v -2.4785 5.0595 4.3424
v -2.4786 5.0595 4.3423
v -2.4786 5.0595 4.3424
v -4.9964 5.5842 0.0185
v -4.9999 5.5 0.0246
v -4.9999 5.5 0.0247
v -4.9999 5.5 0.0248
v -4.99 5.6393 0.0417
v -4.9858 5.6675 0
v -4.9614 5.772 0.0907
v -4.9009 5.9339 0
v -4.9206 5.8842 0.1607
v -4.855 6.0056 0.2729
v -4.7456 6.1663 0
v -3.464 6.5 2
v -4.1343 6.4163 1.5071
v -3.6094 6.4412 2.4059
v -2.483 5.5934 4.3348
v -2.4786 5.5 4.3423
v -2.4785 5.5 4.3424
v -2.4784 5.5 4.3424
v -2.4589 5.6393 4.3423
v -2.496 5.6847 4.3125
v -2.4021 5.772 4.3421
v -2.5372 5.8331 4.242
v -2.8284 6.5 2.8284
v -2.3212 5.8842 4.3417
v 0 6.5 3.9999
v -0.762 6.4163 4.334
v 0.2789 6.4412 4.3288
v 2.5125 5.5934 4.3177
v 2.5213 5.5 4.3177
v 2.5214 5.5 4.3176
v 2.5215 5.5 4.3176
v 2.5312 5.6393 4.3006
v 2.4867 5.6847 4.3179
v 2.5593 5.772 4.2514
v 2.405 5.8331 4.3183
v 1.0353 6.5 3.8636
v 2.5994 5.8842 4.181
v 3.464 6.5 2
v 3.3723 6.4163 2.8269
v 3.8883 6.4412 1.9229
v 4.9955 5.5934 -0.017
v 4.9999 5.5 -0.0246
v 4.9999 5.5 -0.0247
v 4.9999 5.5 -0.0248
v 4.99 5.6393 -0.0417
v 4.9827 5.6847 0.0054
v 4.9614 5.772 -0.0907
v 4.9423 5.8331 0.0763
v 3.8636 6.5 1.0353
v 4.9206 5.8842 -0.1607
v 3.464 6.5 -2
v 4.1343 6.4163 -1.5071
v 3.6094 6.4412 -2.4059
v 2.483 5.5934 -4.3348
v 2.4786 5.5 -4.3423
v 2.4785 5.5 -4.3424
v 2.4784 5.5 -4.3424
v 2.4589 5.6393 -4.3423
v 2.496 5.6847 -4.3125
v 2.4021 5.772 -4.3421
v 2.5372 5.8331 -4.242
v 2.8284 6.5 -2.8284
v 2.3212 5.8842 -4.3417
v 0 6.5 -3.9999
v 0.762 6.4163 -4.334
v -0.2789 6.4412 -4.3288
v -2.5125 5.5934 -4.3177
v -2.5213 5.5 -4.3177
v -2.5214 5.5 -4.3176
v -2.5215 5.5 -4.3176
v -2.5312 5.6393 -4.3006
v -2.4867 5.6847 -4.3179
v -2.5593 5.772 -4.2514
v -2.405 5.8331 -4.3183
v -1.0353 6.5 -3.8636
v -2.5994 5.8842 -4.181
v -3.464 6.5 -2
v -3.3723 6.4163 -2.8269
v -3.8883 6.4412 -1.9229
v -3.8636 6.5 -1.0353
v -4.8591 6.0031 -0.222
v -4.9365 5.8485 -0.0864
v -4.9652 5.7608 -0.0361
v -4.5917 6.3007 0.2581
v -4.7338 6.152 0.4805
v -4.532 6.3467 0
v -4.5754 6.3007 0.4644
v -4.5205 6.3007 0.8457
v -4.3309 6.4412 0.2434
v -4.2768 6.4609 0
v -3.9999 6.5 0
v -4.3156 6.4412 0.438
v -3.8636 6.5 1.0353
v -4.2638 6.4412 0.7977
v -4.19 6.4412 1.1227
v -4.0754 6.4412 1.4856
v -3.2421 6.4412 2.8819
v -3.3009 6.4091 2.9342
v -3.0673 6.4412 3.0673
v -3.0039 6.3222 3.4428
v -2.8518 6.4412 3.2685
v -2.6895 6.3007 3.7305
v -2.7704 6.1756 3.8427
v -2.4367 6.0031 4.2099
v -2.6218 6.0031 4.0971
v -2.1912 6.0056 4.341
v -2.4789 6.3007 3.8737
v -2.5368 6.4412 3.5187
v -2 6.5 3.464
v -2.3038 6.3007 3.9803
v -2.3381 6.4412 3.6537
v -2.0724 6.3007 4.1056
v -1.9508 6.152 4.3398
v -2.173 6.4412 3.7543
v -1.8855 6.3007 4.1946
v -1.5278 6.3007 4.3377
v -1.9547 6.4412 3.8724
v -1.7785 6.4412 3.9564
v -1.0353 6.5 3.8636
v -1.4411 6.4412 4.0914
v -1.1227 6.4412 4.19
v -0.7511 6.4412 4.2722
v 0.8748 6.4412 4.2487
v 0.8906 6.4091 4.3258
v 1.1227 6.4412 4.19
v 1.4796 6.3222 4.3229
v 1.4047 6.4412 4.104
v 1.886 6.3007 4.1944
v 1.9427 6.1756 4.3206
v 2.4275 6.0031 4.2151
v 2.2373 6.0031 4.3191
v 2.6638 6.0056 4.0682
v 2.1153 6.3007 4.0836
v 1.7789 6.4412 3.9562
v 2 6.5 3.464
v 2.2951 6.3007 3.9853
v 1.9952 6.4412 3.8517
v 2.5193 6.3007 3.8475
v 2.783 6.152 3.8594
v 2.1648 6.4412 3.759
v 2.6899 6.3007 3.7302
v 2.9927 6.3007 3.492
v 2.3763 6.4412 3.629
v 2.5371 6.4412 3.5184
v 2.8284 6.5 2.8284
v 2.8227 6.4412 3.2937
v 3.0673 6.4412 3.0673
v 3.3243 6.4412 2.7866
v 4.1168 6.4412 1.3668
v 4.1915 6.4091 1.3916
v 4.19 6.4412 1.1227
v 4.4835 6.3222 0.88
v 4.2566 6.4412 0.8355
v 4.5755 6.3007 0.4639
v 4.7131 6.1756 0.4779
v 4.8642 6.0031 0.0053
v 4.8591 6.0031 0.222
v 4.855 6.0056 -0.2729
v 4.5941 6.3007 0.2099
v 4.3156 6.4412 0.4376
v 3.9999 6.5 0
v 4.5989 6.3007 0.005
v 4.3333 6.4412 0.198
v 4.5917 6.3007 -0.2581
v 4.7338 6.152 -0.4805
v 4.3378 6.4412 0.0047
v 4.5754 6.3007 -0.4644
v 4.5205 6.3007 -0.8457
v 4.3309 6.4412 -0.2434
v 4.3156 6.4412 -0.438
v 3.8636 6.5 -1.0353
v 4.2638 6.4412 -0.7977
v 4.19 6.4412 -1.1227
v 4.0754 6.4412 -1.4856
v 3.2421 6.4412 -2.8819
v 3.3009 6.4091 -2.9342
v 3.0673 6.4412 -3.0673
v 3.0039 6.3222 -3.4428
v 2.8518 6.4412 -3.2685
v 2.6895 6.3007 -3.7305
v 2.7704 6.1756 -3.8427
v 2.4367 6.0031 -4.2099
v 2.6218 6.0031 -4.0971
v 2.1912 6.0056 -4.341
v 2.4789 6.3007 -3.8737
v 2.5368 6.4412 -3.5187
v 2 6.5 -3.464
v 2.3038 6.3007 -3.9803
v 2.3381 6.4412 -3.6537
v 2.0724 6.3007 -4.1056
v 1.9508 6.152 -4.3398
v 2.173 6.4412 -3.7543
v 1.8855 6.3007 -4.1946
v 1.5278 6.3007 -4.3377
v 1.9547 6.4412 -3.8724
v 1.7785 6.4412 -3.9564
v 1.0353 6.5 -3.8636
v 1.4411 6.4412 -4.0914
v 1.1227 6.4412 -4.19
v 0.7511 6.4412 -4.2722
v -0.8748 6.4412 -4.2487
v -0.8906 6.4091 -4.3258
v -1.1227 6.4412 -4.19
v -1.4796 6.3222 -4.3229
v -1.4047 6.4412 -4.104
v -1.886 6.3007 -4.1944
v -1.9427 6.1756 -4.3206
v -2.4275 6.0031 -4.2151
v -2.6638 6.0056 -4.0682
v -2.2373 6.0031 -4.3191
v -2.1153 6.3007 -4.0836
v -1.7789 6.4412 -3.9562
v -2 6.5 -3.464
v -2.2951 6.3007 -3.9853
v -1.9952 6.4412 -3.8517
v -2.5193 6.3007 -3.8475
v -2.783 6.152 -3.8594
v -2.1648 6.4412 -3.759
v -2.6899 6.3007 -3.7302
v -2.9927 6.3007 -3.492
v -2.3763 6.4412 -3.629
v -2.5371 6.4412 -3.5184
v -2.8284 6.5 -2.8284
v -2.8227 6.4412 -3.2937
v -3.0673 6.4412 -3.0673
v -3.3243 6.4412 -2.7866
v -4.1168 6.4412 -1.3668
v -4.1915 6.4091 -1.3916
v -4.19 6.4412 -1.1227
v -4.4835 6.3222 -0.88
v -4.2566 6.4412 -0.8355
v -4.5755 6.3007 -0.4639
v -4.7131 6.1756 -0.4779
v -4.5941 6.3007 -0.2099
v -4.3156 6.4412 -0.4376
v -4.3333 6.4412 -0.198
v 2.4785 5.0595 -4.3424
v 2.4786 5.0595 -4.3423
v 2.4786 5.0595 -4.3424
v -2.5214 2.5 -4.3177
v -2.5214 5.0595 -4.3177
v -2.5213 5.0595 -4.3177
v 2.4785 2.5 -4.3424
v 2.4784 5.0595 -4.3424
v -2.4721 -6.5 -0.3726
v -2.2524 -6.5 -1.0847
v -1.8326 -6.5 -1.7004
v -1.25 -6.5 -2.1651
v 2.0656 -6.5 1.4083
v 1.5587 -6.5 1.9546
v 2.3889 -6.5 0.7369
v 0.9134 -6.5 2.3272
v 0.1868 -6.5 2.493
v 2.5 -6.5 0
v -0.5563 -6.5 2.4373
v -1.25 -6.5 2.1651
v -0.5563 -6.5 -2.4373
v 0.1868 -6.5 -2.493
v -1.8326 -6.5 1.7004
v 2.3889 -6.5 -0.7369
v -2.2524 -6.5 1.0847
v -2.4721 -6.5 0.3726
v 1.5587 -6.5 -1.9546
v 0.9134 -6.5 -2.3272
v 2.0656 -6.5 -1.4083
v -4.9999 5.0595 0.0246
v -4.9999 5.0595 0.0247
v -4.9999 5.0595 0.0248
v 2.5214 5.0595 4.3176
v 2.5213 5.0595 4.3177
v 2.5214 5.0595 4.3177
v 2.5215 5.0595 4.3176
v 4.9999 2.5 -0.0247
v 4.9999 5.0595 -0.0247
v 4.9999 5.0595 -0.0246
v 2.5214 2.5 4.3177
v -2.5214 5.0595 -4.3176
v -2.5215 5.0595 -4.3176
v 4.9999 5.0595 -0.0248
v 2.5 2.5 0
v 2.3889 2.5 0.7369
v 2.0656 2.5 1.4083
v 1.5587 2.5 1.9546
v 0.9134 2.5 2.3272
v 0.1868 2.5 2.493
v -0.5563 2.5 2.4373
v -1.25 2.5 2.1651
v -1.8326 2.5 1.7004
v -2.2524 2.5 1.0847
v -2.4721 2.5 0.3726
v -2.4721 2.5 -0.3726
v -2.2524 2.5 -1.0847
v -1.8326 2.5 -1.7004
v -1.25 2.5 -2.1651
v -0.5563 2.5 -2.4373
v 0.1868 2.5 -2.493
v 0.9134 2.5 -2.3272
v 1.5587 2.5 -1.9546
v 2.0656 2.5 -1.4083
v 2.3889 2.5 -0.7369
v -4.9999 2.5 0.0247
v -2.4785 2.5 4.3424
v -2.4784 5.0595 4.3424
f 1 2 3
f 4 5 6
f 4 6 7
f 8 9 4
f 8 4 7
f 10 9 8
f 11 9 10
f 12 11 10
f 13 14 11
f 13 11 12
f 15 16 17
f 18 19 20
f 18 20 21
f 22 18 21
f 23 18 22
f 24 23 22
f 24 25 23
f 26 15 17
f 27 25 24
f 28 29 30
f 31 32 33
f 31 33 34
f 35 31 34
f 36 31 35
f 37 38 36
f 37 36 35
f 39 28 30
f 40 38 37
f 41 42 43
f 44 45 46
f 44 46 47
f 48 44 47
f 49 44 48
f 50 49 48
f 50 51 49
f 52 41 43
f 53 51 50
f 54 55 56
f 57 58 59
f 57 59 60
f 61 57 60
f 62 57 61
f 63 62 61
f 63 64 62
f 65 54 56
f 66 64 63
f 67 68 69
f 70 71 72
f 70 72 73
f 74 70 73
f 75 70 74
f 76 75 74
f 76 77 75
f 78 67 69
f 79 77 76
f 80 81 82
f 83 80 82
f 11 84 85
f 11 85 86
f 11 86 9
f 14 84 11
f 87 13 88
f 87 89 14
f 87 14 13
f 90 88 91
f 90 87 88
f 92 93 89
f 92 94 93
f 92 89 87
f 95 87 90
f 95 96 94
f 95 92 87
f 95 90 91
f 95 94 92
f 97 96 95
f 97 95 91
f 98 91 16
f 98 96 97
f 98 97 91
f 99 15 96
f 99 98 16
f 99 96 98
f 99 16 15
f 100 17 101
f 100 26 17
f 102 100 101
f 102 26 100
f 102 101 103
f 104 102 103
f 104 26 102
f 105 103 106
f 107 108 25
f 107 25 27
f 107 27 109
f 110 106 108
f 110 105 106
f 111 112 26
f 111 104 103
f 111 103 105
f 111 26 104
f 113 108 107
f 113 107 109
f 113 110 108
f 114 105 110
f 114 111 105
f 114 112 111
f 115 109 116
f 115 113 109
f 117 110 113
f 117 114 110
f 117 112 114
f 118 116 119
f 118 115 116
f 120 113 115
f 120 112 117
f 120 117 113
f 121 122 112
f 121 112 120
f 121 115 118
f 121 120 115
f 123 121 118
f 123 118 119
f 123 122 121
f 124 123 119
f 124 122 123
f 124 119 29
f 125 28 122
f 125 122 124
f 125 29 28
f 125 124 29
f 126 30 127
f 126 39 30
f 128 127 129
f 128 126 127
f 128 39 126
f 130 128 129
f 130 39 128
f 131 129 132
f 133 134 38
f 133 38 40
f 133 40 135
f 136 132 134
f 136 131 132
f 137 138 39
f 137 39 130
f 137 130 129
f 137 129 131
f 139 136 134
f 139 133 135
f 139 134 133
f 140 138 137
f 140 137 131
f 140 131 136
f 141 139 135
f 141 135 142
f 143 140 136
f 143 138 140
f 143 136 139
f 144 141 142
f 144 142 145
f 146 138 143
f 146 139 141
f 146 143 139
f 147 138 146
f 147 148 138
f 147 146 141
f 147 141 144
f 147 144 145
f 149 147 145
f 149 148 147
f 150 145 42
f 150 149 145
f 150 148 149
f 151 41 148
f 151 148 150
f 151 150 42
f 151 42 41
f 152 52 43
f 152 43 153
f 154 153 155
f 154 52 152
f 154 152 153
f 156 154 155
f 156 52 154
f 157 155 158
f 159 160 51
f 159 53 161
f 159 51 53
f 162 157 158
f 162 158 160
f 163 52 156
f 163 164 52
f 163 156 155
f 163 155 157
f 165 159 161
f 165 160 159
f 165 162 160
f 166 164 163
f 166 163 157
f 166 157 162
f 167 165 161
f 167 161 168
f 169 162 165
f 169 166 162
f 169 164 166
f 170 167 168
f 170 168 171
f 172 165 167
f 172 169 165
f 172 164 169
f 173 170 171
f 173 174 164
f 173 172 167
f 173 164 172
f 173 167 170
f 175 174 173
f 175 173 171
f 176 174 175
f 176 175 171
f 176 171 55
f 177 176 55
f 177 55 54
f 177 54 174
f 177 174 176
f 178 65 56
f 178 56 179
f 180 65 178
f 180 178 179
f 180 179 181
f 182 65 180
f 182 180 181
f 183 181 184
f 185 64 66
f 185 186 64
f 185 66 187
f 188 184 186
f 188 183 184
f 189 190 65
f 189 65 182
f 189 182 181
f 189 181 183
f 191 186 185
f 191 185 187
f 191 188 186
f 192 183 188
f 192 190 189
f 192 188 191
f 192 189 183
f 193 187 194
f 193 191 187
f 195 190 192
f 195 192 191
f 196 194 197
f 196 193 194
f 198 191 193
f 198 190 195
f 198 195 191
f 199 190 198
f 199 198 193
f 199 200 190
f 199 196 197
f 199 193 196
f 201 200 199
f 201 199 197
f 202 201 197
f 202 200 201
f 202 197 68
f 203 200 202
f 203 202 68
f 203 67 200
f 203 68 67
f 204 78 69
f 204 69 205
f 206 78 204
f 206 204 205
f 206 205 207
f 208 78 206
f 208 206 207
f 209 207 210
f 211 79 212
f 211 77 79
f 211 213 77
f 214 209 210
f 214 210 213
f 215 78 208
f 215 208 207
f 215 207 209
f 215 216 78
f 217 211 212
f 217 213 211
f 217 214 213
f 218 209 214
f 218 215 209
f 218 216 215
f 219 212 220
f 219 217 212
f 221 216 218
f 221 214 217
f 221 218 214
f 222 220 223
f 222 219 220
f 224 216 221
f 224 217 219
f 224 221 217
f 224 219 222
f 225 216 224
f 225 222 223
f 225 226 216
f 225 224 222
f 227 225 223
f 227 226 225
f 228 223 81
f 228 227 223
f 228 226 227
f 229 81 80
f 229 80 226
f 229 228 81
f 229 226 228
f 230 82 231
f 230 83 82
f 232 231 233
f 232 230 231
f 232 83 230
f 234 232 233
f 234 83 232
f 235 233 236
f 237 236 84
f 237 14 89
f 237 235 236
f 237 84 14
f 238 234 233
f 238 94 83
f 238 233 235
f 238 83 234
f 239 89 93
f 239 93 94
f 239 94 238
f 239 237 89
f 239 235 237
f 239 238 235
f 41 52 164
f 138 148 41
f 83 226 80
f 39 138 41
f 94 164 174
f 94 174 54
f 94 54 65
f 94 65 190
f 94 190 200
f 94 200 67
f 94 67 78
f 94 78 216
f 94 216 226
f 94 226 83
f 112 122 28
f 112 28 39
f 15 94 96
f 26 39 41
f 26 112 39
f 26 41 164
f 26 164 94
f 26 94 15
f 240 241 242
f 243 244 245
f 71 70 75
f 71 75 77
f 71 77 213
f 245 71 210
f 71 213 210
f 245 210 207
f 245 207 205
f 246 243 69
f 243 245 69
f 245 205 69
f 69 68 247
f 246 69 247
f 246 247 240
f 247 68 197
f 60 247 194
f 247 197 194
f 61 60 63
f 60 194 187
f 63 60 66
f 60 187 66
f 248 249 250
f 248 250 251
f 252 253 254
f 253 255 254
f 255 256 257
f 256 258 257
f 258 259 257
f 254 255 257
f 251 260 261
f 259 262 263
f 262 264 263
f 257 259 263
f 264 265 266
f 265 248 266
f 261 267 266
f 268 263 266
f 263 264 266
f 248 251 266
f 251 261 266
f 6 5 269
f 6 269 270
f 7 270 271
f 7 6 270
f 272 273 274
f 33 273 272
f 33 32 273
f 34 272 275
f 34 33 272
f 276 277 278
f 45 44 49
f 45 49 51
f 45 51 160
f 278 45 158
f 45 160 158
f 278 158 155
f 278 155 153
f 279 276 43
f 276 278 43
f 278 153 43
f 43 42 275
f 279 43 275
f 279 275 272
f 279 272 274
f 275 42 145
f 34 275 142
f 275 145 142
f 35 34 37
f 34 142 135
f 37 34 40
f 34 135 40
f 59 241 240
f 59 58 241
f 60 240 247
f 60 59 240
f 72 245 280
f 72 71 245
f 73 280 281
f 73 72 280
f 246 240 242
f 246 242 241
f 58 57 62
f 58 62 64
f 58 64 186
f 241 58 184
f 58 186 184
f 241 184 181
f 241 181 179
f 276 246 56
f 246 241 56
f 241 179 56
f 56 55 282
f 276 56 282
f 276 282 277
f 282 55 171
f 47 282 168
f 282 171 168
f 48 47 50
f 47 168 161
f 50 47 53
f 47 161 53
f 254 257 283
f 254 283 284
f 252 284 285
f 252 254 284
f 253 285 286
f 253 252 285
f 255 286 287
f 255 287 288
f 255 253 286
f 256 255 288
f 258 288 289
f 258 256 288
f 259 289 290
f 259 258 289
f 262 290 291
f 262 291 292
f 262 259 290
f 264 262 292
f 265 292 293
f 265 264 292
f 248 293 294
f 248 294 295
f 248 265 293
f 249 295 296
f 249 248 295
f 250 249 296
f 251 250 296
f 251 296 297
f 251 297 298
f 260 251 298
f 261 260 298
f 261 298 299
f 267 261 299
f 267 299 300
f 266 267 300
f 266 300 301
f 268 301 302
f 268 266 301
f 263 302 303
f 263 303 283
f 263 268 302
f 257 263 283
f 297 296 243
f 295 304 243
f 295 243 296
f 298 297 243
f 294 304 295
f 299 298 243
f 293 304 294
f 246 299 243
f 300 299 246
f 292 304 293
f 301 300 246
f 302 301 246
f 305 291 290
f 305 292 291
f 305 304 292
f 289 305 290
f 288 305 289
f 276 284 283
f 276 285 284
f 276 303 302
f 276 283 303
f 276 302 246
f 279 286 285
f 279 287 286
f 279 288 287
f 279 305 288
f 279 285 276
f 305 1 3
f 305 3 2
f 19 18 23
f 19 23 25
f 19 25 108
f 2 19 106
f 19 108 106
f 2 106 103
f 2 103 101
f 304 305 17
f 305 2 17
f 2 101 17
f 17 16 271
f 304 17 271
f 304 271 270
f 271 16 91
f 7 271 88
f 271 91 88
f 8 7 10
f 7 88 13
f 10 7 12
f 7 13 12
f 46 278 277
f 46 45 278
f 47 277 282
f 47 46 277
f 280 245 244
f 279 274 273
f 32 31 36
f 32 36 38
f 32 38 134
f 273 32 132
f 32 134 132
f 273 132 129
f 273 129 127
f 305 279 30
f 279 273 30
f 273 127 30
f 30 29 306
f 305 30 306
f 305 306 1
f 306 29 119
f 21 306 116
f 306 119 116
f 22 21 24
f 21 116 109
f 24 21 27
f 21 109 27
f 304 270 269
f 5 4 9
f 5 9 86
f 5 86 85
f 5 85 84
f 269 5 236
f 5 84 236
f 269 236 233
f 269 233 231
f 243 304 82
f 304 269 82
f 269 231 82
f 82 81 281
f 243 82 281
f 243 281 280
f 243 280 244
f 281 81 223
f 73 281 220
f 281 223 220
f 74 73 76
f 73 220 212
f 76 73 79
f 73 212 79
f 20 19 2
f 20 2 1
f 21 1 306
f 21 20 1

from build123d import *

# Parameters (mm, degrees)
SKETCH1_R           = 5
BOSS_EXTRUDE1_DEPTH = 6.5
SKETCH2_R           = 5
SKETCH2_R_2         = 2.5
CUT_EXTRUDE1_DEPTH  = 9
CUT_EXTRUDE2_DEPTH  = 4


with BuildPart() as part:
    # Sketch1 → Boss-Extrude1 (new body, symmetric)
    with BuildSketch(Plane(origin=(0, 0, 0), x_dir=(1, 0, 0), z_dir=(0, 1, 0))):
        Circle(SKETCH1_R)
    extrude(amount=BOSS_EXTRUDE1_DEPTH, both=True)

    # Sketch2 → Cut-Extrude1 (cut)
    with BuildSketch(Plane.XZ.offset(6.5)):
        Circle(SKETCH2_R)
        Circle(SKETCH2_R_2, mode=Mode.SUBTRACT)
    extrude(amount=-CUT_EXTRUDE1_DEPTH, mode=Mode.SUBTRACT)

    # Sketch4 → Cut-Extrude2 (cut)
    with BuildSketch(Plane(origin=(0, 6.5, 0), x_dir=(1, 0, 0), z_dir=(0, 1, 0))):
        with BuildLine():
            Line((-4.999938781, -0.024742442), (-2.521396974, 4.317702781))
            ThreePointArc((-2.521396974, 4.317702781), (-4.342445223, 2.478541807), (-4.999938781, -0.024742442))
        make_face()
        with BuildLine():
            Line((-2.478541807, -4.342445223), (-4.999938781, -0.024742442))
            ThreePointArc((-4.999938781, -0.024742442), (-4.317702781, -2.521396974), (-2.478541807, -4.342445223))
        make_face()
        with BuildLine():
            ThreePointArc((-2.478541807, -4.342445223), (0.024742442, -4.999938781), (2.521396974, -4.317702781))
            Line((2.521396974, -4.317702781), (-2.478541807, -4.342445223))
        make_face()
        with BuildLine():
            ThreePointArc((5, 0), (4.999984695, 0.012371259), (4.999938781, 0.024742442))
            Line((4.999938781, 0.024742442), (2.521396974, -4.317702781))
            ThreePointArc((2.521396974, -4.317702781), (4.336299394, -2.489278523), (5, 0))
        make_face()
        with BuildLine():
            ThreePointArc((4.999938781, 0.024742442), (4.317702781, 2.521396974), (2.478541807, 4.342445223))
            Line((2.478541807, 4.342445223), (4.999938781, 0.024742442))
        make_face()
        with BuildLine():
            Line((-2.521396974, 4.317702781), (2.478541807, 4.342445223))
            ThreePointArc((2.478541807, 4.342445223), (-0.024742442, 4.999938781), (-2.521396974, 4.317702781))
        make_face()
    extrude(amount=-CUT_EXTRUDE2_DEPTH, mode=Mode.SUBTRACT)

    # Sketch5 → Cut-Revolve1 (revolve, cut)
    with BuildSketch(Plane.XY):
        with BuildLine():
            Line((-3.722260503, 6.5), (-3.722260503, 8.060451161))
            Line((-3.722260503, 8.060451161), (-6.740732256, 6.10732238))
            Line((-6.740732256, 6.10732238), (-4.999938781, 5.059459129))
            Line((-4.999938781, 5.059459129), (-4.999938781, 5.5))
            ThreePointArc((-4.999938781, 5.5), (-4.707045562, 6.207106781), (-3.999938781, 6.5))
            Line((-3.999938781, 6.5), (-3.722260503, 6.5))
        make_face()
    revolve(axis=Axis((0, 0, 0), (0, 1, 0)), mode=Mode.SUBTRACT)


solid = part.part
